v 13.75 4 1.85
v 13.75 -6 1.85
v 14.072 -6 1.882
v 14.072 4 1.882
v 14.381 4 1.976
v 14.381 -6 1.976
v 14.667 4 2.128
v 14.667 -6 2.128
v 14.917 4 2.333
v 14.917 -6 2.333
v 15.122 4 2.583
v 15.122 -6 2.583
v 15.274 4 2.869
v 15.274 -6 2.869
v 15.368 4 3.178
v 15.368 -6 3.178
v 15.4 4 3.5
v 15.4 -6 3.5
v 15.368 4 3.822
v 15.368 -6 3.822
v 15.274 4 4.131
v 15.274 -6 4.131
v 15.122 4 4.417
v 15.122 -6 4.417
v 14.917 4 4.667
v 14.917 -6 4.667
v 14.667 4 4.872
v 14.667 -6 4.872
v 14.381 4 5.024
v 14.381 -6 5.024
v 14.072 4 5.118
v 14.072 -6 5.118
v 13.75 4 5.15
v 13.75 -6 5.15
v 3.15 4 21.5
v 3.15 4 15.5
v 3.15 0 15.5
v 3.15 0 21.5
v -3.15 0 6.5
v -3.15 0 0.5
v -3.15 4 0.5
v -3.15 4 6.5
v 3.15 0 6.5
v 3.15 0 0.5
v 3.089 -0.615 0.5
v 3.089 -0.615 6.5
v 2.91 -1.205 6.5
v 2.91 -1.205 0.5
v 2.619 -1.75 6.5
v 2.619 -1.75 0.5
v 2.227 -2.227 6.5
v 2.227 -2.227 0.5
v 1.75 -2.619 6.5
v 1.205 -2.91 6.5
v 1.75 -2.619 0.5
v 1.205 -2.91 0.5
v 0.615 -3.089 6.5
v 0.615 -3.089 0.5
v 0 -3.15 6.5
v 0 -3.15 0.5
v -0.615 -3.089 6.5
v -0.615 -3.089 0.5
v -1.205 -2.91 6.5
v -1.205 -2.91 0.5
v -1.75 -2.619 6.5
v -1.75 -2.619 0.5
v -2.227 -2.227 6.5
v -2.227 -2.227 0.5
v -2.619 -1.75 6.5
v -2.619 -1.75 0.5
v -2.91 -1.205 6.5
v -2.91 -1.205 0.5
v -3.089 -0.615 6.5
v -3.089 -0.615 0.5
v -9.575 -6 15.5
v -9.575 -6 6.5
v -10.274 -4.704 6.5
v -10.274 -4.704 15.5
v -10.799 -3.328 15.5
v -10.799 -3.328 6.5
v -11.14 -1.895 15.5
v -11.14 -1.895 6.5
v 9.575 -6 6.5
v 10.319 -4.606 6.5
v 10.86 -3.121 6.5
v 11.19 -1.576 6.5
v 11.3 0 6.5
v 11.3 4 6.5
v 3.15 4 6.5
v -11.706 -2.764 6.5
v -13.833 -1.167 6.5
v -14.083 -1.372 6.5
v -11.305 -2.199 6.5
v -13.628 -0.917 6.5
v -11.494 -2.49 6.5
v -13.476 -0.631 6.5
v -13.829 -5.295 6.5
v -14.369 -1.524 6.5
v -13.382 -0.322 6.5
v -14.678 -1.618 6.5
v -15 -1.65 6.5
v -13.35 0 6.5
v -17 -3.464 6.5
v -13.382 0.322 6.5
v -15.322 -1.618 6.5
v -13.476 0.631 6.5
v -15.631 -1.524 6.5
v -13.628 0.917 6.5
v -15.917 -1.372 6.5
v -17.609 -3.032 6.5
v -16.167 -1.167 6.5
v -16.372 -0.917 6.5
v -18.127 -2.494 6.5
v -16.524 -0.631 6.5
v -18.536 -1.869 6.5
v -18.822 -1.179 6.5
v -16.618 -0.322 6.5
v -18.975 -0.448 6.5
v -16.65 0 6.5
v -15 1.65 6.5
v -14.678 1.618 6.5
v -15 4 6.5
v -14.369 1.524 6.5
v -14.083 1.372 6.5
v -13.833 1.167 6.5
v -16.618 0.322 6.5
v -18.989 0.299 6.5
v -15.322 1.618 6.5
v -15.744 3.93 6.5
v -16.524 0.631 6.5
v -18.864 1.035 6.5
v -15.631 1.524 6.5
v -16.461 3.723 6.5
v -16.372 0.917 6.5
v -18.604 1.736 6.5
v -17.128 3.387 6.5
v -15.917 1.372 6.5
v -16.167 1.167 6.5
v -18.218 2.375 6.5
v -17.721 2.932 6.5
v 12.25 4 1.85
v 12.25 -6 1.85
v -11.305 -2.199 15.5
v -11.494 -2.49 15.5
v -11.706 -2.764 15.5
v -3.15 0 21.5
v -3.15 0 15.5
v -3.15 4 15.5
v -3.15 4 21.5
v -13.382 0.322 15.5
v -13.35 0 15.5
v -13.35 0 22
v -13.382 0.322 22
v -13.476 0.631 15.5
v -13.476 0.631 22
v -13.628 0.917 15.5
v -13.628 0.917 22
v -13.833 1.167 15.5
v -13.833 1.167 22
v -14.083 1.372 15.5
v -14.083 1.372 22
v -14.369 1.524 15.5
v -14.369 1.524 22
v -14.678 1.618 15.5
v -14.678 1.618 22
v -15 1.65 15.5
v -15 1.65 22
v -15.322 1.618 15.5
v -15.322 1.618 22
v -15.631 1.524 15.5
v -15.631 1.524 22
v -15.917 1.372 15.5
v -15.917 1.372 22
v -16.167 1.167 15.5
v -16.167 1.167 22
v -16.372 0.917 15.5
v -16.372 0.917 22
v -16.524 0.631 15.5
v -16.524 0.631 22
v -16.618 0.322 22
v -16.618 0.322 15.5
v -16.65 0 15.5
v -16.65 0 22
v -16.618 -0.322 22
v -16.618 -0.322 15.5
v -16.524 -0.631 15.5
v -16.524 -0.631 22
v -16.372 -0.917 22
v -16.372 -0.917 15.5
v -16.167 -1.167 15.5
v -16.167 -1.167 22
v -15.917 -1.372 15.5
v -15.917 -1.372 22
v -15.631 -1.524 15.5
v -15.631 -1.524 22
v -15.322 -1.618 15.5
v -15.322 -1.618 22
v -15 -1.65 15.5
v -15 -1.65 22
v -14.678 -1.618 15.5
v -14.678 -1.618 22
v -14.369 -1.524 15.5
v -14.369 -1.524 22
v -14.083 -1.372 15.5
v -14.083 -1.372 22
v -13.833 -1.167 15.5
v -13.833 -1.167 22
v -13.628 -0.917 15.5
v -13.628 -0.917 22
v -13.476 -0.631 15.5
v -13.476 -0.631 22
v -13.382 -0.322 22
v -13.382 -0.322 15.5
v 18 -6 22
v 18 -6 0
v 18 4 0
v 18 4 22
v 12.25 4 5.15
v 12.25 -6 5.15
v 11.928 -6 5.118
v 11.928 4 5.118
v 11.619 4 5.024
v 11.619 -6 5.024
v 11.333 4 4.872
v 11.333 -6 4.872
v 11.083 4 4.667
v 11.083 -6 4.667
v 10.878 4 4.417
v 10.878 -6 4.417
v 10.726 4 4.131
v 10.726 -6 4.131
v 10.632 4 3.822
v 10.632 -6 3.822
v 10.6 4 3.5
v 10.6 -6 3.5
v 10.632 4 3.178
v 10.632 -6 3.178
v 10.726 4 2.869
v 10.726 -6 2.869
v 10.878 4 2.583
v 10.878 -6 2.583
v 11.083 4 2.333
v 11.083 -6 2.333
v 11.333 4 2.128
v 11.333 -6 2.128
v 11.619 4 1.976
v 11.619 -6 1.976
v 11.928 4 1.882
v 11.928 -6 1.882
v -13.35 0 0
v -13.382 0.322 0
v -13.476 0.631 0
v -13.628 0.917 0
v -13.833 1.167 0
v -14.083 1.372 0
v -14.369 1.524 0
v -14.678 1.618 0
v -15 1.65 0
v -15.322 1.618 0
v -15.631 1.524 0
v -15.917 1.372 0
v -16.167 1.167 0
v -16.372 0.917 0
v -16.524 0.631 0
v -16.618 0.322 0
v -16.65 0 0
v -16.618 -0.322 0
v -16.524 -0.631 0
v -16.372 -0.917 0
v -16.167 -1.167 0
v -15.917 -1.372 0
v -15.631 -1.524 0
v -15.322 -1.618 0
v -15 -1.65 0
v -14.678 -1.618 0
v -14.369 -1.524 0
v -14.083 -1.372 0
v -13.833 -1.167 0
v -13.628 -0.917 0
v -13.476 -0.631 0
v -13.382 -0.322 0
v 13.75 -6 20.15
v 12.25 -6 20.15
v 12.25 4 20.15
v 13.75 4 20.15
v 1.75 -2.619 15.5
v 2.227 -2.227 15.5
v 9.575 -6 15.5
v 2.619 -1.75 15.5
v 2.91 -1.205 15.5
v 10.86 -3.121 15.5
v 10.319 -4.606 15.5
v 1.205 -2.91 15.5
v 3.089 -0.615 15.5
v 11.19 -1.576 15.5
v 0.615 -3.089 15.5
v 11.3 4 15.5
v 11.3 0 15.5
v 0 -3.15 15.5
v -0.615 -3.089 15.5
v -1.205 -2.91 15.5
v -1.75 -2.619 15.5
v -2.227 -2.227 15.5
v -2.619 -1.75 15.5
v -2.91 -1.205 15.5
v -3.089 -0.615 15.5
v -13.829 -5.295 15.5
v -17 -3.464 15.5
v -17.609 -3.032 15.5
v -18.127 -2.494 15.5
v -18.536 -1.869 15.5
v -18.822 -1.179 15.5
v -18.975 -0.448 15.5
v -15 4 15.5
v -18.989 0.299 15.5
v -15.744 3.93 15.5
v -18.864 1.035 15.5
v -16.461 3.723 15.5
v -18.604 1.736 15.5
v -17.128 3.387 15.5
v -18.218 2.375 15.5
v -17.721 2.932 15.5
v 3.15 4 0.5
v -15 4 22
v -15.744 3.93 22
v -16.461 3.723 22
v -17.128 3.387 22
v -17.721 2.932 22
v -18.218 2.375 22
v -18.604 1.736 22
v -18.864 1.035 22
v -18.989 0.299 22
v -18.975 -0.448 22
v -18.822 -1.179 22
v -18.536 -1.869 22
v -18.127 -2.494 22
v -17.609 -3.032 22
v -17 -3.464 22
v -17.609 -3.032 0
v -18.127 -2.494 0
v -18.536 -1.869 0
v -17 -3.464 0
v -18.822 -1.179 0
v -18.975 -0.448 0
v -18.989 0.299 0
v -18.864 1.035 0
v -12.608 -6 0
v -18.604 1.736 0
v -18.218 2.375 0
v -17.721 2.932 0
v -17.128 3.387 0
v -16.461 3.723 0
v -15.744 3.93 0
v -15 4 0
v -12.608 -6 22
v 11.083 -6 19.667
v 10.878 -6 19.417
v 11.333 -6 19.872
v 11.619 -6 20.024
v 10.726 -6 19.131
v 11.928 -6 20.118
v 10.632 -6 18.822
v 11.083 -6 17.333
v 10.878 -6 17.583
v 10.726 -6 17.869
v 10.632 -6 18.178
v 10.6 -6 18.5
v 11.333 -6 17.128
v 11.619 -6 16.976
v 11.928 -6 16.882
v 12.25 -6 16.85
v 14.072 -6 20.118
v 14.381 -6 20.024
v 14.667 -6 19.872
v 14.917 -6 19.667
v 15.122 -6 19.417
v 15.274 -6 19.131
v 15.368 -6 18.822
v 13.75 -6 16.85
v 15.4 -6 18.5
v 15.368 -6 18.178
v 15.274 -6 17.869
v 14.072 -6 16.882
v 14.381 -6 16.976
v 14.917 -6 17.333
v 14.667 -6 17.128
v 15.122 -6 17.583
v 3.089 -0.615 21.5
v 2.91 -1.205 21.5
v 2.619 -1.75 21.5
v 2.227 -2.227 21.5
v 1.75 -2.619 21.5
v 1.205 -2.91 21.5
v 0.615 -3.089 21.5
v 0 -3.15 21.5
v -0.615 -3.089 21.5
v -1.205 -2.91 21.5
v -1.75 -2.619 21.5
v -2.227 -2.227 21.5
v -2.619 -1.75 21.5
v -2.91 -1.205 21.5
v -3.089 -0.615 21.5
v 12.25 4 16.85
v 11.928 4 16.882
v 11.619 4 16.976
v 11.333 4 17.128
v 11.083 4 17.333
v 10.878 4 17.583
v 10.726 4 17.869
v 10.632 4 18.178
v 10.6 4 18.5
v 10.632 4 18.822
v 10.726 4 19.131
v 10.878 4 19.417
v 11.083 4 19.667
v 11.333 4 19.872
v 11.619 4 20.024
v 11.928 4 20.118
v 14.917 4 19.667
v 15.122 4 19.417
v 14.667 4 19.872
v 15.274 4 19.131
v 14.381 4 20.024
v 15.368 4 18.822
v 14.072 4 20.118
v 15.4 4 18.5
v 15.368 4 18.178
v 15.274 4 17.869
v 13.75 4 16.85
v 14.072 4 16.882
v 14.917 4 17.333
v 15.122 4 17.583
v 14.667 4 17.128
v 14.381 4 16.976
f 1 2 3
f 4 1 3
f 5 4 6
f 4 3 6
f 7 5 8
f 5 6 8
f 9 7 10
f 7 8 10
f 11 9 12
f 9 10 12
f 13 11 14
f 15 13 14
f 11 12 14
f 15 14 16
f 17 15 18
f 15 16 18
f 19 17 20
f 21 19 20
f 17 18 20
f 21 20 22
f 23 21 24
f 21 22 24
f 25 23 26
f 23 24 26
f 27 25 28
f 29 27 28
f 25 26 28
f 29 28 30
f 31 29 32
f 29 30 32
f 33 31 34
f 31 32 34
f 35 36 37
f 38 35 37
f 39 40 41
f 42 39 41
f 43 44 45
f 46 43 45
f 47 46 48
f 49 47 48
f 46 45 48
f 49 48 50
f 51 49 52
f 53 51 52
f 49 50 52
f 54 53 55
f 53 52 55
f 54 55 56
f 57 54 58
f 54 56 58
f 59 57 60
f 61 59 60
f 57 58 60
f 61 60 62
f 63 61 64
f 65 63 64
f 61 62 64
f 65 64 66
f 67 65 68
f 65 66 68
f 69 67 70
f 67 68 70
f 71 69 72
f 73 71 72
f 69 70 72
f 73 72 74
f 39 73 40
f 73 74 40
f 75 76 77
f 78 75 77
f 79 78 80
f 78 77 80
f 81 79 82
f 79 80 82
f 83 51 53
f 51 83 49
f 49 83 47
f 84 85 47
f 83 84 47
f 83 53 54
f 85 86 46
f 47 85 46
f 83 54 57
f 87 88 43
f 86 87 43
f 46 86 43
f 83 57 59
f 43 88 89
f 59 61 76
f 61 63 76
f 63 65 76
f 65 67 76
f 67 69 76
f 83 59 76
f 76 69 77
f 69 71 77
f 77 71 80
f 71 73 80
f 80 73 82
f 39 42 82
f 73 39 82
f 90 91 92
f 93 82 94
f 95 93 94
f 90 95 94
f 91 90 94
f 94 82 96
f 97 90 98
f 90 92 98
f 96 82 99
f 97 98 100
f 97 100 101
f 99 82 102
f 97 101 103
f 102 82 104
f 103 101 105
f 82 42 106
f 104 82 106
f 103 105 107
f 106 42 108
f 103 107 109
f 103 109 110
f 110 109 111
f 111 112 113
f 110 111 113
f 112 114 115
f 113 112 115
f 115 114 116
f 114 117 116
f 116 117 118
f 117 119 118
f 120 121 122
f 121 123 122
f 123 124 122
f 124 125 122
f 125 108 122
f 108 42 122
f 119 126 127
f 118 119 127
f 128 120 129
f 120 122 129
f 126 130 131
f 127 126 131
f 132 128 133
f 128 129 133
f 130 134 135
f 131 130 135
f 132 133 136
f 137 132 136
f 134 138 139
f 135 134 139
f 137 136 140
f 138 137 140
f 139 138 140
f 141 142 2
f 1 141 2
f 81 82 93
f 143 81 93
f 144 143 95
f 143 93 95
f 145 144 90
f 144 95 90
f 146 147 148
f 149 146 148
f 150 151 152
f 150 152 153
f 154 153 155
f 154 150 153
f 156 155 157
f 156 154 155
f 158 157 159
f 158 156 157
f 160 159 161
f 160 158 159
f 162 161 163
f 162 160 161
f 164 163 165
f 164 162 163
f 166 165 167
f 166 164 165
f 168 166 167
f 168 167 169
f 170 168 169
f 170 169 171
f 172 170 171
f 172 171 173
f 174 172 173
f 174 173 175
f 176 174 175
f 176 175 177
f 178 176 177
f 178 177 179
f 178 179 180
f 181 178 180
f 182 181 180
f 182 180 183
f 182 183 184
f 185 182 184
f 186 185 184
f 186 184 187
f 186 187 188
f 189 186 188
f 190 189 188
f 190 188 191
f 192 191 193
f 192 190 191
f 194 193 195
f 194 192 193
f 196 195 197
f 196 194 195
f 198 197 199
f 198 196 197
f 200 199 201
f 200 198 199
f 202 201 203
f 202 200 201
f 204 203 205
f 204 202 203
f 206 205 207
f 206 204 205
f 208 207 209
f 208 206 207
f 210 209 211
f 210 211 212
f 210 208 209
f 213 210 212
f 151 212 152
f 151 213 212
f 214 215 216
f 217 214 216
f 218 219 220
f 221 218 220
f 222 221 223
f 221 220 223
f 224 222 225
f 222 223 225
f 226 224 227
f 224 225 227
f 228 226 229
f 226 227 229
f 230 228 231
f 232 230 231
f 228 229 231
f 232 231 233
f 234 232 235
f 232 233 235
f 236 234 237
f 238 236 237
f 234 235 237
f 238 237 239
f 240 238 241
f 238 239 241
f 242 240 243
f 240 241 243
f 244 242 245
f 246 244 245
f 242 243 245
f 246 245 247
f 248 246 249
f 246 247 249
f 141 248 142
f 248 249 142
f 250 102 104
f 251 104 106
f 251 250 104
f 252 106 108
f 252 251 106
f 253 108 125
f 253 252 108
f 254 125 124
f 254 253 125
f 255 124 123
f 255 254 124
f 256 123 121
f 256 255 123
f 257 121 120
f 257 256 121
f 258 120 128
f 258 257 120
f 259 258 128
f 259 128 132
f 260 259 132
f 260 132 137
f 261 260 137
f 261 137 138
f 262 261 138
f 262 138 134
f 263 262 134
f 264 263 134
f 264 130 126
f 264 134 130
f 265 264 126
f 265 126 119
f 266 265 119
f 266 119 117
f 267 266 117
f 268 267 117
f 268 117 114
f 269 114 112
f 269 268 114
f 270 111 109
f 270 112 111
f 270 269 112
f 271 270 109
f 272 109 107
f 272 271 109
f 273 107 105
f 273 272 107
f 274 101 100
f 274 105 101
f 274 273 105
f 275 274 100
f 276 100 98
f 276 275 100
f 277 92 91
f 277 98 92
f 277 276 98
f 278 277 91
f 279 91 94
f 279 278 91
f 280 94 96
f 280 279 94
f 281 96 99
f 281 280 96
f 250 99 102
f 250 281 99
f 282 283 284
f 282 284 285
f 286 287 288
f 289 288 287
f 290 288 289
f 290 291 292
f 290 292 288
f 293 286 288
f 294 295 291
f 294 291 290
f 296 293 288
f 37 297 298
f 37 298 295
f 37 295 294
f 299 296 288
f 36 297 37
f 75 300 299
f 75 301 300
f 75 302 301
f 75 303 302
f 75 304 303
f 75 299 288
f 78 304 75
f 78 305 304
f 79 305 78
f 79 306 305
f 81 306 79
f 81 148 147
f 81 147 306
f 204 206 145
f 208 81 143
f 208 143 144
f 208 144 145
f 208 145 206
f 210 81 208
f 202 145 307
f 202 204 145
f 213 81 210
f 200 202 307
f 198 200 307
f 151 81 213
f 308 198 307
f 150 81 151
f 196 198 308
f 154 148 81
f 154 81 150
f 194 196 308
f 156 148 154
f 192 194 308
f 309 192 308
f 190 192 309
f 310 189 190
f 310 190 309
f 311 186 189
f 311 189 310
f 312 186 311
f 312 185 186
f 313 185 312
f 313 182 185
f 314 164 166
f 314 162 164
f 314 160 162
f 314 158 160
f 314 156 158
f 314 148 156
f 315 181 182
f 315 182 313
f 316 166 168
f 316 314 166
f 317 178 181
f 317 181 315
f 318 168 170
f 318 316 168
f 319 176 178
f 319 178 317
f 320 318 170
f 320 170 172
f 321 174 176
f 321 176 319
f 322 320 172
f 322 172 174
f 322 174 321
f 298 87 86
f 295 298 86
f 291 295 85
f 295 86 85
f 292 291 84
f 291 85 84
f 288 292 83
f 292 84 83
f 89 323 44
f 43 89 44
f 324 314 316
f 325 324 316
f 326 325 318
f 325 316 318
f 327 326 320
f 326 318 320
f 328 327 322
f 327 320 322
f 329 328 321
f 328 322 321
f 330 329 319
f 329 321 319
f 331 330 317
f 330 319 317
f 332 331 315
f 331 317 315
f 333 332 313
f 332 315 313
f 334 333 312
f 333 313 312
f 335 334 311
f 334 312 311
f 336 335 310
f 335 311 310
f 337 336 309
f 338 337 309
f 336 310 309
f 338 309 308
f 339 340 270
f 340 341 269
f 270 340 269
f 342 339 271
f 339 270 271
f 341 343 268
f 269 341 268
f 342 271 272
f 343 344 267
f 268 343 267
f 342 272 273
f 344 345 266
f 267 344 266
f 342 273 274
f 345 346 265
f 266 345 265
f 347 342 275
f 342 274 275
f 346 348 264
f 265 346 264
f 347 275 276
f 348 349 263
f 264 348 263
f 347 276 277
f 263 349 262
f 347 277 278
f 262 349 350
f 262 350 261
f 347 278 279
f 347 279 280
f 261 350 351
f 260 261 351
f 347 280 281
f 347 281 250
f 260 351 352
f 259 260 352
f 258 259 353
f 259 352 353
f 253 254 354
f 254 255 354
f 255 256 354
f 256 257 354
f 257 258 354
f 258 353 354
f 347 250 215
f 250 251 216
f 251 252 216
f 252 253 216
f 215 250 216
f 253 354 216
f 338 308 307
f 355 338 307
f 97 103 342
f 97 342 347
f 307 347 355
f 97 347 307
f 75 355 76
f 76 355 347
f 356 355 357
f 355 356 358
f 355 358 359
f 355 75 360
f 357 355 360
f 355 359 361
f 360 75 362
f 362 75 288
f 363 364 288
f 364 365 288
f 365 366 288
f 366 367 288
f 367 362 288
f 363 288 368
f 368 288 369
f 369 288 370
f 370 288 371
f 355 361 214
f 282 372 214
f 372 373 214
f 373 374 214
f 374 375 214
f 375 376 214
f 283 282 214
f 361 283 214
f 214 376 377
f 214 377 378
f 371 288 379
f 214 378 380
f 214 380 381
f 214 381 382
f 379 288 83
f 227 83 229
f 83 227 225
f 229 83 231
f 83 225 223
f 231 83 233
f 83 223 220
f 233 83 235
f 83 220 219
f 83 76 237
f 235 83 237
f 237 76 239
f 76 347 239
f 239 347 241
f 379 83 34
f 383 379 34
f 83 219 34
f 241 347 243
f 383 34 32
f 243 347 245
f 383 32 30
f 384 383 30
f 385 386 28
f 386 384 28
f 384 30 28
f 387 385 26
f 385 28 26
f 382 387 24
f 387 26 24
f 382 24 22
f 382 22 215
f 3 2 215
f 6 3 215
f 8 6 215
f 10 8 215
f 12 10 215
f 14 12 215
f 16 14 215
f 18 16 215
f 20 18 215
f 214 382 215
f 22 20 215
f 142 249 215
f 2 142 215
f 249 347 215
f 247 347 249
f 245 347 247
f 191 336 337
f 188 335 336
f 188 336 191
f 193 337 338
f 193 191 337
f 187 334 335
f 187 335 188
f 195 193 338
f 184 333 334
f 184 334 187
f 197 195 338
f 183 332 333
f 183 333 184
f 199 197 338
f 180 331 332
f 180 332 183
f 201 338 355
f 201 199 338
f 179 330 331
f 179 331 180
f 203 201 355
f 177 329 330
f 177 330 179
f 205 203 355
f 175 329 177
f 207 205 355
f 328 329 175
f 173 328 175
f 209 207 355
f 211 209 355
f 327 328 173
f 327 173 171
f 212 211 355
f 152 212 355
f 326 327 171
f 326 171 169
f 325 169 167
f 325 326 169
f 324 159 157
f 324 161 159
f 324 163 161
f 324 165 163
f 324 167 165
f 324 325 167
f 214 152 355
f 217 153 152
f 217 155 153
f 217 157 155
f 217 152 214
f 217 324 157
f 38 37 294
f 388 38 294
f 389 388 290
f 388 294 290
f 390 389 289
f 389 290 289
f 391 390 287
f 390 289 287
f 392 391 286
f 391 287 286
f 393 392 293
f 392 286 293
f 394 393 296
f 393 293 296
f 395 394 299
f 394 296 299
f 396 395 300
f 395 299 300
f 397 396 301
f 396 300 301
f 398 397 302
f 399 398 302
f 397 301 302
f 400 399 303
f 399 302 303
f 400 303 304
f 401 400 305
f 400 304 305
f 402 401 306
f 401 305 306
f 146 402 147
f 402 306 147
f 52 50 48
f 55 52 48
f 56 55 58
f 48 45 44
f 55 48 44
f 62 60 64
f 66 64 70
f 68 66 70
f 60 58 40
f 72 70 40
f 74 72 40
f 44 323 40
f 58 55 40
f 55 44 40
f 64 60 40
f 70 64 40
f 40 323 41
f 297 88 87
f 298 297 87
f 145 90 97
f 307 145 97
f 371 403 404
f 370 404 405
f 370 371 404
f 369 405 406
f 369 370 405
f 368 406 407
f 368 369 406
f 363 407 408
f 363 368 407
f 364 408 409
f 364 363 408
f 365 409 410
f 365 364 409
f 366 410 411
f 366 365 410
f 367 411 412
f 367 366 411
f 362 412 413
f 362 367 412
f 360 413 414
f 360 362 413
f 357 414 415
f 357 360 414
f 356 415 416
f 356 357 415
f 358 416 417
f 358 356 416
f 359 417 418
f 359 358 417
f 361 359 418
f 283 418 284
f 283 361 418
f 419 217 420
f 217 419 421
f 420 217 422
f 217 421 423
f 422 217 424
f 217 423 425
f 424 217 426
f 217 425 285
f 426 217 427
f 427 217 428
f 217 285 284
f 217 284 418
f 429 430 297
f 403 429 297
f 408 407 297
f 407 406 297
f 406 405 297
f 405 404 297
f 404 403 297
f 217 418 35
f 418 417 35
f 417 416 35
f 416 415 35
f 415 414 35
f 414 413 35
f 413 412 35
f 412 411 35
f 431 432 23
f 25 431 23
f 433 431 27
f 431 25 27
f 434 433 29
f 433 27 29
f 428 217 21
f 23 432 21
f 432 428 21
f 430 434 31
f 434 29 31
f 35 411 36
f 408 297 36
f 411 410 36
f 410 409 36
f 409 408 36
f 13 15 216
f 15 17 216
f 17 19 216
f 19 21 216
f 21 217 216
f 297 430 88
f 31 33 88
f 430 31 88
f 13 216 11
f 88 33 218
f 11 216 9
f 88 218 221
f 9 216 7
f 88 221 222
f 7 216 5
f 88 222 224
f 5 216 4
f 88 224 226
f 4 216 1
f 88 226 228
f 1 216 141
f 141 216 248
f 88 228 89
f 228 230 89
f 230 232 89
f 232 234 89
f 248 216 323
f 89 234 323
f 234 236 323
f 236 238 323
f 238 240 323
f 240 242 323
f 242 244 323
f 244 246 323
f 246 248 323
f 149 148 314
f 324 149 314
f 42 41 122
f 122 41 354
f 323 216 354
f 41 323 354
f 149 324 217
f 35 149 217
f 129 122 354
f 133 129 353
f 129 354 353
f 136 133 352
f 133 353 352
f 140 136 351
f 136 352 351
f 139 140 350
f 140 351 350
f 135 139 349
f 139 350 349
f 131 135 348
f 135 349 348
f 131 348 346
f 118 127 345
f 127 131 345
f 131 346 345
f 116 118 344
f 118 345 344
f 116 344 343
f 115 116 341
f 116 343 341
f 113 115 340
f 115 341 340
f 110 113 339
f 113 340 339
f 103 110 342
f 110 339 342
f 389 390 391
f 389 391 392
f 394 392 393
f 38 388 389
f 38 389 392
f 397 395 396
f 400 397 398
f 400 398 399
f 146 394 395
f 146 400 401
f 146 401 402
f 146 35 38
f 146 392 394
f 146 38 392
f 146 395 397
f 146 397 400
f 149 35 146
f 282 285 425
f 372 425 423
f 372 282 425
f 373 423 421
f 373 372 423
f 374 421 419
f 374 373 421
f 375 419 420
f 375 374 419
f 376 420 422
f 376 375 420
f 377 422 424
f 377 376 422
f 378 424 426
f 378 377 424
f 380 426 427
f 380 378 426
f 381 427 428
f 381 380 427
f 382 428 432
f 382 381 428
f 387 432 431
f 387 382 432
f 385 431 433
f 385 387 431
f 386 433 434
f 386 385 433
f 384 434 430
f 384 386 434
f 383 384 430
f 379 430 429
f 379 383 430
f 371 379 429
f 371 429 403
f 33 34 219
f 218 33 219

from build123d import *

# Parameters (mm, degrees)
SKETCH1_R               = 1.65
BOSS_EXTRUDE1_DEPTH     = 22
CUT_EXTRUDE1_DEPTH      = 4.5
CUT_EXTRUDE1_DEPTH_BACK = 4.5
CUT_EXTRUDE3_DEPTH      = 10.5
CUT_EXTRUDE3_DEPTH_BACK = 10.5
CUT_EXTRUDE2_DEPTH      = 31.740852298


with BuildPart() as part:
    # Sketch1 → Boss-Extrude1 (new body)
    with BuildSketch(Plane.XY):
        with BuildLine():
            Line((-17, -3.464101615), (-12.607695155, -6))
            Line((-12.607695155, -6), (18, -6))
            Line((18, -6), (18, 4))
            Line((18, 4), (-15, 4))
            ThreePointArc((-15, 4), (-18.863703305, 1.03527618), (-17, -3.464101615))
        make_face()
        with Locations((-15, 0)):
            Circle(SKETCH1_R, mode=Mode.SUBTRACT)
    extrude(amount=BOSS_EXTRUDE1_DEPTH)

    # Sketch2 → Cut-Extrude1 (cut, two sides: drawn at the far end of the back side and taken through both)
    with BuildSketch(Plane.XY.offset(11).offset(-CUT_EXTRUDE1_DEPTH_BACK)):
        with BuildLine():
            Line((-11.706008895, -2.763986722), (-19.3, -11.814152904))
            Line((-19.3, -11.814152904), (-19.3, 11.3))
            Line((-19.3, 11.3), (11.3, 11.3))
            Line((11.3, 11.3), (11.3, 0))
            ThreePointArc((11.3, 0), (0.950789146, -11.259928952), (-11.14, -1.894835085))
            ThreePointArc((-11.14, -1.894835085), (-11.396702437, -2.346539297), (-11.706008895, -2.763986722))
        make_face()
    extrude(amount=CUT_EXTRUDE1_DEPTH + CUT_EXTRUDE1_DEPTH_BACK, mode=Mode.SUBTRACT)

    # Sketch4 → Cut-Extrude3 (cut, two sides: drawn at the far end of the back side and taken through both)
    with BuildSketch(Plane.XY.offset(11).offset(-CUT_EXTRUDE3_DEPTH_BACK)):
        with BuildLine():
            Line((-3.15, 0), (-3.15, 6.453034263))
            Line((-3.15, 6.453034263), (3.15, 6.453034263))
            Line((3.15, 6.453034263), (3.15, 0))
            ThreePointArc((3.15, 0), (0, -3.15), (-3.15, 0))
        make_face()
    extrude(amount=CUT_EXTRUDE3_DEPTH + CUT_EXTRUDE3_DEPTH_BACK, mode=Mode.SUBTRACT)

    # Sketch3 → Cut-Extrude2 (cut, through all)
    with BuildSketch(Plane.XZ.offset(6)):
        with BuildLine():
            Line((13.75, 16.85), (12.25, 16.85))
            ThreePointArc((12.25, 16.85), (10.6, 18.5), (12.25, 20.15))
            Line((12.25, 20.15), (13.75, 20.15))
            ThreePointArc((13.75, 20.15), (15.4, 18.5), (13.75, 16.85))
        make_face()
        with BuildLine():
            Line((13.75, 5.15), (12.25, 5.15))
            ThreePointArc((12.25, 5.15), (10.6, 3.5), (12.25, 1.85))
            Line((12.25, 1.85), (13.75, 1.85))
            ThreePointArc((13.75, 1.85), (15.4, 3.5), (13.75, 5.15))
        make_face()
    extrude(amount=-CUT_EXTRUDE2_DEPTH, mode=Mode.SUBTRACT)


solid = part.part
